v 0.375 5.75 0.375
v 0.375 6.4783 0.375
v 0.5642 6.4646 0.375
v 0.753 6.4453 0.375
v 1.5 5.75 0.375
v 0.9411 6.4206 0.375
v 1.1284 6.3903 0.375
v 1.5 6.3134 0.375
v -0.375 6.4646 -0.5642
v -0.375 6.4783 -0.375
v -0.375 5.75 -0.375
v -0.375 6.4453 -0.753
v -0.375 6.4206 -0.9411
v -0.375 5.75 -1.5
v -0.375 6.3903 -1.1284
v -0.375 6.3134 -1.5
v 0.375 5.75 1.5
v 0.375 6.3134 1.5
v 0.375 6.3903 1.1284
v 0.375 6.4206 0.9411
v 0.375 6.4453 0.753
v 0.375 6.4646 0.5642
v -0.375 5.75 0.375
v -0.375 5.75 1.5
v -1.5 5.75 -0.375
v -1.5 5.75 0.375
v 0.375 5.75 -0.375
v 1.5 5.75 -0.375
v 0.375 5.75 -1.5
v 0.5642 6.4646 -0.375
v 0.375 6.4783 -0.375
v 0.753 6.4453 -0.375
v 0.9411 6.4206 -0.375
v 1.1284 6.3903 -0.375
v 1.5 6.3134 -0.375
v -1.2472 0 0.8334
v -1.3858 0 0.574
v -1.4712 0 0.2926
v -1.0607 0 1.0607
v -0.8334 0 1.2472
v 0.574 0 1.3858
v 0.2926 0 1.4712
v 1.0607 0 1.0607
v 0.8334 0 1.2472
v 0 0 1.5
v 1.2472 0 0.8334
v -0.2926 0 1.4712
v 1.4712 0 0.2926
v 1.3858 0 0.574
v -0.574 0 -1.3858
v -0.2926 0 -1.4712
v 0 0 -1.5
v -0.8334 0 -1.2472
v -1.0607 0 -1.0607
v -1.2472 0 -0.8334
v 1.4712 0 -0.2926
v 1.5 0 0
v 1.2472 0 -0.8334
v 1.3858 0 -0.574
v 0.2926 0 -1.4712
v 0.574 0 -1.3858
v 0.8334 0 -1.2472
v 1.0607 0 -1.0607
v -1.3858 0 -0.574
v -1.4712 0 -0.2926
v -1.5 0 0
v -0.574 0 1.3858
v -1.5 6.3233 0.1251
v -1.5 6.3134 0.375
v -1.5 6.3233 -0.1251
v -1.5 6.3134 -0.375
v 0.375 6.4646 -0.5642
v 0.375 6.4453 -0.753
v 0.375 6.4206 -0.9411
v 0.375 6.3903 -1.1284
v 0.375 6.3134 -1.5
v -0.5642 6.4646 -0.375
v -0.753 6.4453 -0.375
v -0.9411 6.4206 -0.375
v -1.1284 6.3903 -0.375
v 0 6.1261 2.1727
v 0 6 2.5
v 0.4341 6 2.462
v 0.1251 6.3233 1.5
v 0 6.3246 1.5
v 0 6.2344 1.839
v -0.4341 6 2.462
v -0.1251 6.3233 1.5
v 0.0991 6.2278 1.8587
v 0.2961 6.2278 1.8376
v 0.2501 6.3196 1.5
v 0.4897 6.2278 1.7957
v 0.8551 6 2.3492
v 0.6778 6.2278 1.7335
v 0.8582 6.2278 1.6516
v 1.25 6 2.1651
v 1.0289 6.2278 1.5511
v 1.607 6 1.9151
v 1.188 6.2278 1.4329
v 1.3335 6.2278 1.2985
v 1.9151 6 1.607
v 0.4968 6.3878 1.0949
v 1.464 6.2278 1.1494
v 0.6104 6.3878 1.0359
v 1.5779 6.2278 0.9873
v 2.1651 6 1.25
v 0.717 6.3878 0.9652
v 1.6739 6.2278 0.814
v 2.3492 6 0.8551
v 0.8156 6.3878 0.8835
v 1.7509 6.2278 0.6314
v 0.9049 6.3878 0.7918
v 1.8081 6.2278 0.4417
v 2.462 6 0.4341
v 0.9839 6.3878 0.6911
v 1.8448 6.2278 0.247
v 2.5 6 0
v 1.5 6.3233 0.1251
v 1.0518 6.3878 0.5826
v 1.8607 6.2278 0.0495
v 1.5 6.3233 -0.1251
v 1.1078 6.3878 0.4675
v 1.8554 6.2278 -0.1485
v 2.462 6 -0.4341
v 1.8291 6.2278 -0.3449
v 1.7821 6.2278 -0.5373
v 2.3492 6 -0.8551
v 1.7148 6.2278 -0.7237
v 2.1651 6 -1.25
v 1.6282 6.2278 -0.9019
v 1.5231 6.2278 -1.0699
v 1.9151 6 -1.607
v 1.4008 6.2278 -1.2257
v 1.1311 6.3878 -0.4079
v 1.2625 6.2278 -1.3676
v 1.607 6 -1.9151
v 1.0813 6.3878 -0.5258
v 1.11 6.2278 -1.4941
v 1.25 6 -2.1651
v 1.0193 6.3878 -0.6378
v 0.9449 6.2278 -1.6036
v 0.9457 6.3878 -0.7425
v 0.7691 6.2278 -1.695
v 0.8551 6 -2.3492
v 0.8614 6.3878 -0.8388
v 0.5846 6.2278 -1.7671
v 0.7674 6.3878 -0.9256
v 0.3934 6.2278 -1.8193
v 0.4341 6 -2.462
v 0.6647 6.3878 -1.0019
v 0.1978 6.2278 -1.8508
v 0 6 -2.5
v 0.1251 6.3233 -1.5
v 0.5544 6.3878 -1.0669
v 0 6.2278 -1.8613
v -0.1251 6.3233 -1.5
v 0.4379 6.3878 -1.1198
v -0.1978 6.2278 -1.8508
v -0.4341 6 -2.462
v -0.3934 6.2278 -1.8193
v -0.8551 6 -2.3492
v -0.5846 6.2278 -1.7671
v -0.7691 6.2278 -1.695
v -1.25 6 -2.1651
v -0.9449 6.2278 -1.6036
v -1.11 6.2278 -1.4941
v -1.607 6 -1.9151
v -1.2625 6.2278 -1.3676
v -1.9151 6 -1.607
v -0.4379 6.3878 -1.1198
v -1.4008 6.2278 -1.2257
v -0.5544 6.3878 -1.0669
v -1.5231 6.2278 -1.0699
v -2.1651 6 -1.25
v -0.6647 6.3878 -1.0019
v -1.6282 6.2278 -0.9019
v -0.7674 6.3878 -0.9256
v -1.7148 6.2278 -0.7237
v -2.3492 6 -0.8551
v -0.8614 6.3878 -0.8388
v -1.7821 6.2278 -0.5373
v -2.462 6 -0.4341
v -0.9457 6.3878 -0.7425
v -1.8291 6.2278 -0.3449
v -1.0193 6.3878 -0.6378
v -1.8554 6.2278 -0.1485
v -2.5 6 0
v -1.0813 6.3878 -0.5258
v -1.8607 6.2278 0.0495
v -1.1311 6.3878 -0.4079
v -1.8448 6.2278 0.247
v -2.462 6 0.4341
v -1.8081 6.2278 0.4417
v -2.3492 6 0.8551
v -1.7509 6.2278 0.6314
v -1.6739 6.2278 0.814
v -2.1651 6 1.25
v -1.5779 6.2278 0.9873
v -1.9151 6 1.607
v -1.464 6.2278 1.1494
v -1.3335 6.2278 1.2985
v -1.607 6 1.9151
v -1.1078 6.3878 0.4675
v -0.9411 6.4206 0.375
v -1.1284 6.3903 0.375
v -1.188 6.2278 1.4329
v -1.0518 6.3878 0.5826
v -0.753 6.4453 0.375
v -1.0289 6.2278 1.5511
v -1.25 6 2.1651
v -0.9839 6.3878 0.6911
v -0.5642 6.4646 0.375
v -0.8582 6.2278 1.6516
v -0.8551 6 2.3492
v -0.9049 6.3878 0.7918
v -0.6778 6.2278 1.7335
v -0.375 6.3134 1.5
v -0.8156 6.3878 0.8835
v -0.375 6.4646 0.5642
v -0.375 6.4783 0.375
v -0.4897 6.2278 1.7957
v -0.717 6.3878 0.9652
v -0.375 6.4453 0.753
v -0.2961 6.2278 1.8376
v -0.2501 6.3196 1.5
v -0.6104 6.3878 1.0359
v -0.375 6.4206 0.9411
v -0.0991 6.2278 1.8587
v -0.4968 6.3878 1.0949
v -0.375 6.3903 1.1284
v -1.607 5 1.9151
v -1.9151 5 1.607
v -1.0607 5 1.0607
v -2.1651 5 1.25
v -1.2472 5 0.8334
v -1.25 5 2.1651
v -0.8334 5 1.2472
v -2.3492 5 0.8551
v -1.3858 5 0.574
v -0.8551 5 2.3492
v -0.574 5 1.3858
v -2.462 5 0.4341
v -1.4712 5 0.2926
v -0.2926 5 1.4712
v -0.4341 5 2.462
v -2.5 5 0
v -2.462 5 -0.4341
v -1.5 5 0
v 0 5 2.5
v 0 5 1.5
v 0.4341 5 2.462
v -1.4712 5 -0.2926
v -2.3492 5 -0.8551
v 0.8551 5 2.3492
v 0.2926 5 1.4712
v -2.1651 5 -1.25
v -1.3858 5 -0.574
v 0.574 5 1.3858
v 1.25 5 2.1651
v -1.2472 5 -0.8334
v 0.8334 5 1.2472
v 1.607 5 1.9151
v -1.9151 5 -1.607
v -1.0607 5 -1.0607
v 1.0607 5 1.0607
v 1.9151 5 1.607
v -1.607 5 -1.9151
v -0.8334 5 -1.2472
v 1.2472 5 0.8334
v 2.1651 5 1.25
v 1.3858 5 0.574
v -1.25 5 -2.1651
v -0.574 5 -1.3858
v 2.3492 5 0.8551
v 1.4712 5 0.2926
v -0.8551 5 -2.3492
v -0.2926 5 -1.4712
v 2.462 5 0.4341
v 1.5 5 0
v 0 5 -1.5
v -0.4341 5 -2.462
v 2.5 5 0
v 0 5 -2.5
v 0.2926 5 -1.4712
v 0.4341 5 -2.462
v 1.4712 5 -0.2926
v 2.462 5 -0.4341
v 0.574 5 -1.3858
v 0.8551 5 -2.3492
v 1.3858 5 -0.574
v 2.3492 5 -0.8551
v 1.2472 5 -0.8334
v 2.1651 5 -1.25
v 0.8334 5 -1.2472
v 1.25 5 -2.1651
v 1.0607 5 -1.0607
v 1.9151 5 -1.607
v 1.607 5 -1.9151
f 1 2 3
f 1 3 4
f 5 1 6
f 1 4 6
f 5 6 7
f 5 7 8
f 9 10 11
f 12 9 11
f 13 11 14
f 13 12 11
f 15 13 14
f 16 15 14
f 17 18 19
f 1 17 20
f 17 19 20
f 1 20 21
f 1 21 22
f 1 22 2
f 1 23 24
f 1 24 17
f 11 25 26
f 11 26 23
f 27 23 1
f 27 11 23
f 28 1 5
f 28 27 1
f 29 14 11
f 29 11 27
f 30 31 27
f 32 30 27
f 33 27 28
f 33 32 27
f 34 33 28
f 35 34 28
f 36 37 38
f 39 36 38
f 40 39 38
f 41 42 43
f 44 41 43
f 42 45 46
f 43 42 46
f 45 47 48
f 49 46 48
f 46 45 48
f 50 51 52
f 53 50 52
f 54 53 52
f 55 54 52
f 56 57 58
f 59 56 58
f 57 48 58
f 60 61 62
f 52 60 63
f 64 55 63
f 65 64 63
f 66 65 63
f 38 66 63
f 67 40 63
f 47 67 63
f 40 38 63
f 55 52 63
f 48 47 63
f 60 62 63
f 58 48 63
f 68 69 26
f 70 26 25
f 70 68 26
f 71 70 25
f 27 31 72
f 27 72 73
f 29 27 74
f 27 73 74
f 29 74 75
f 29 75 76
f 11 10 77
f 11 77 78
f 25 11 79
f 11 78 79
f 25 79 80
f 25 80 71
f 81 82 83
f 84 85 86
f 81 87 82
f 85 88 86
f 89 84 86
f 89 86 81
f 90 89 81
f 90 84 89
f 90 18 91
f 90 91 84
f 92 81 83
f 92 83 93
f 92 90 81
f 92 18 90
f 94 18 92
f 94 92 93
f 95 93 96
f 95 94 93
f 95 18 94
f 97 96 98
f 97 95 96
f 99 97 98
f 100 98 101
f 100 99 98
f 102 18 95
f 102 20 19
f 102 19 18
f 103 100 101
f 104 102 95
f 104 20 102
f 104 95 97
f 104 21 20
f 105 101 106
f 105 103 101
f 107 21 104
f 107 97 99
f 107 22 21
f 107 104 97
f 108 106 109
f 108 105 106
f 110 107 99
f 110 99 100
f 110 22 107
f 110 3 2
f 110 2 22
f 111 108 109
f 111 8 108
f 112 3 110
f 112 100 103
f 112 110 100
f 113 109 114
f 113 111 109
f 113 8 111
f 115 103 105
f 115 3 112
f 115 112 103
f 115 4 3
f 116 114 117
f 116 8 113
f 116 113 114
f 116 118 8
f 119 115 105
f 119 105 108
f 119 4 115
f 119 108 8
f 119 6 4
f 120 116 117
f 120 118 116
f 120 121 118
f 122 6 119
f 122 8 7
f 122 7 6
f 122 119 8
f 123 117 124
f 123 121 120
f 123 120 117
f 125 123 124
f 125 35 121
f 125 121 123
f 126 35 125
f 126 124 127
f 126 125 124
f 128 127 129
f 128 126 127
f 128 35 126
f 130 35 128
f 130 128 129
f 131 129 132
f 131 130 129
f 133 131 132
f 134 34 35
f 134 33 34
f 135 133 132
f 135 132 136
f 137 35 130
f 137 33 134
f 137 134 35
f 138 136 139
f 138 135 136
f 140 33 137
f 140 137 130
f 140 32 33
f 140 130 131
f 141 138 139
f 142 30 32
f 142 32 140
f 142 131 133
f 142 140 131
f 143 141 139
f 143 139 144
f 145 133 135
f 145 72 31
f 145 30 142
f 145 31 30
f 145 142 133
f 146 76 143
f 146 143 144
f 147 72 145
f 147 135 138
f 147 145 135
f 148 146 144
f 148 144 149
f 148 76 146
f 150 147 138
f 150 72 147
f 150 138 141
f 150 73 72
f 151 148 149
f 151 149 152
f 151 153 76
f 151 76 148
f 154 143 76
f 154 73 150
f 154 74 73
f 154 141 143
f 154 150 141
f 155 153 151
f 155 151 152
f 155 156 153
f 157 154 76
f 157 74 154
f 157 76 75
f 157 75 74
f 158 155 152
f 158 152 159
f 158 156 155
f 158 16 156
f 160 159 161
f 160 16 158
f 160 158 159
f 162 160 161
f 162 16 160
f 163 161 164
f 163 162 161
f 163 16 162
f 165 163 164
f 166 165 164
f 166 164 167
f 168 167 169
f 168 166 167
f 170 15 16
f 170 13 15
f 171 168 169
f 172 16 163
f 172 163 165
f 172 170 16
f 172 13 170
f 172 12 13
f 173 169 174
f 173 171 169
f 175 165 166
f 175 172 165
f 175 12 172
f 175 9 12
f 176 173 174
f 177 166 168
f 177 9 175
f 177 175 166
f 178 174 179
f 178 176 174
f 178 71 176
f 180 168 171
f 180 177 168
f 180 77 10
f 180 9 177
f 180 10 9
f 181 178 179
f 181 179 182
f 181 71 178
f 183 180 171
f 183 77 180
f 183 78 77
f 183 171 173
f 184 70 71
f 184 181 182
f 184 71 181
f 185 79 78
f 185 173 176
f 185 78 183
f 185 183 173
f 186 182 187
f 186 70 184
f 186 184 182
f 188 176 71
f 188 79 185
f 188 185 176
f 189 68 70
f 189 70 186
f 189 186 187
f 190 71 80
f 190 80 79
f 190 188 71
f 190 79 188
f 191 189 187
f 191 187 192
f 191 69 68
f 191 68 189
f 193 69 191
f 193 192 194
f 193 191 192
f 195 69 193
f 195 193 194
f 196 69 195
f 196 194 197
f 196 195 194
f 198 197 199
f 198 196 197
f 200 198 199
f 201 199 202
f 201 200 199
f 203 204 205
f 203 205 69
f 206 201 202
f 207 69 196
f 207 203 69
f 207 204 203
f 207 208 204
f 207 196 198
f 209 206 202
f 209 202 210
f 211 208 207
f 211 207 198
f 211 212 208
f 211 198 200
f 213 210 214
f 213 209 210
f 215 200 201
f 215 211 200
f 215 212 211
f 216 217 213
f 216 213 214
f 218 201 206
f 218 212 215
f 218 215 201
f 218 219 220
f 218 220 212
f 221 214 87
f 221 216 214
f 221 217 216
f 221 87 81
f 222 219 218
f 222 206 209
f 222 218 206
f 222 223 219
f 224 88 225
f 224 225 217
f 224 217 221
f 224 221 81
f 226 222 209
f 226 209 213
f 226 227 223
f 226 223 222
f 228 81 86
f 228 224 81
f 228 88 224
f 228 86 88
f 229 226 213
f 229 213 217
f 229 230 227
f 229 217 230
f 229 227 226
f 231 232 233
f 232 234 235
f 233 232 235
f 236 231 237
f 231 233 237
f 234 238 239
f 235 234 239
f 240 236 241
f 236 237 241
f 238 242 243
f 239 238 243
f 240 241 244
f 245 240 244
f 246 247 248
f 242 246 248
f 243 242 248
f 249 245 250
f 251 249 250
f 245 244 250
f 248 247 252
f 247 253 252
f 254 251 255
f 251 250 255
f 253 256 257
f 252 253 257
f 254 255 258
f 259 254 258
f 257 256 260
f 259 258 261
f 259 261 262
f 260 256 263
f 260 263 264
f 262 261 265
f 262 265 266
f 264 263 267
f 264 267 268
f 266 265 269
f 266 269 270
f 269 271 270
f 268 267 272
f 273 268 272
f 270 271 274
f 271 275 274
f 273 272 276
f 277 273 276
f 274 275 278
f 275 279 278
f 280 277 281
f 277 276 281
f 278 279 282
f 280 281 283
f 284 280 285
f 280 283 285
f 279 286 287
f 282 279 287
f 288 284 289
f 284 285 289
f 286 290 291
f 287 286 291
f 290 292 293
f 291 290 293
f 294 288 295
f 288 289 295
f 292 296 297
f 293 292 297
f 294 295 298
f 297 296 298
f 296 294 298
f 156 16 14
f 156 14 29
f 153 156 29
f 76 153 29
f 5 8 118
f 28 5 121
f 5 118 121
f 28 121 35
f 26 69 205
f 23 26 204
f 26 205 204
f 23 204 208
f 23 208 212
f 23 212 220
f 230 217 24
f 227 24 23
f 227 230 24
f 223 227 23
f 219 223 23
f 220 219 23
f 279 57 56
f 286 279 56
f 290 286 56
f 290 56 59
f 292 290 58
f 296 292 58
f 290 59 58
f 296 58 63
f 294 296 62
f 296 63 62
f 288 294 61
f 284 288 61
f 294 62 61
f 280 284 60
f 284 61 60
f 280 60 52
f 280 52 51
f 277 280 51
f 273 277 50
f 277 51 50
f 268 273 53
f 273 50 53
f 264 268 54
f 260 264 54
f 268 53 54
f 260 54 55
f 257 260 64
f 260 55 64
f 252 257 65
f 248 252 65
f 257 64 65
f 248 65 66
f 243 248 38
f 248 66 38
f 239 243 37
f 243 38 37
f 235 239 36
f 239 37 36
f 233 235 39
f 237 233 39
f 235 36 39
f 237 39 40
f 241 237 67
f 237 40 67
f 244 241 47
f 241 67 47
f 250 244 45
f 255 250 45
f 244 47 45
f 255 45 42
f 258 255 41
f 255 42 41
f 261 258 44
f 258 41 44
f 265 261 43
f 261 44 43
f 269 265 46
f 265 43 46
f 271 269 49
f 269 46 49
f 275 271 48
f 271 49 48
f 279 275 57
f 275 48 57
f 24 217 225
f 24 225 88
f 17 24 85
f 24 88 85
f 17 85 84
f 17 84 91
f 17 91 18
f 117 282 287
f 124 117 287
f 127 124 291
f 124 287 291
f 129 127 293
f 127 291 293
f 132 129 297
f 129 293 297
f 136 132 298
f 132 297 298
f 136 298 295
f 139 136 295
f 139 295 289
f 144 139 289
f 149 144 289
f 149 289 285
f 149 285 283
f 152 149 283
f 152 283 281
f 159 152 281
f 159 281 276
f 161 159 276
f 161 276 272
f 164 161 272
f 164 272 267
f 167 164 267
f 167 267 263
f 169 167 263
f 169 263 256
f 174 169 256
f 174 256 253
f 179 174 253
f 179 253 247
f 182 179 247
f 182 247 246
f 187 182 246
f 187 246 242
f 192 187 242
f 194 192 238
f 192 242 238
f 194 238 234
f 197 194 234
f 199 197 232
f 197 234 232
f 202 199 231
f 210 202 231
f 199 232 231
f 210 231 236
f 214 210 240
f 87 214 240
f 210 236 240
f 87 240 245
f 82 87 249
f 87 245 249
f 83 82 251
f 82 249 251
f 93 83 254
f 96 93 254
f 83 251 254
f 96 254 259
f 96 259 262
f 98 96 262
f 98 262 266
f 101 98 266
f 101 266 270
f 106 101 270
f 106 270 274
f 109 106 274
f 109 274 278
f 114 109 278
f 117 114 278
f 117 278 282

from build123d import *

# Parameters (mm, degrees)
SKETCH1_R           = 1.5
BOSS_EXTRUDE1_DEPTH = 5
SKETCH2_R           = 2.5
BOSS_EXTRUDE2_DEPTH = 1
DOME1_FACE_RADIUS   = 2.5
DOME1_HEIGHT        = 0.5
SKETCH3_W           = 1.125
SKETCH3_H           = 0.75
SKETCH3_W_2         = 0.75
SKETCH3_H_2         = 1.125
CUT_EXTRUDE1_DEPTH  = 0.75


with BuildPart() as part:
    # Sketch1 → Boss-Extrude1 (new body)
    with BuildSketch(Plane(origin=(0, 0, 0), x_dir=(1, 0, 0), z_dir=(0, 1, 0))):
        Circle(SKETCH1_R)
    extrude(amount=BOSS_EXTRUDE1_DEPTH)

    # Sketch2 → Boss-Extrude2 (add)
    with BuildSketch(Plane(origin=(0, 5, 0), x_dir=(1, 0, 0), z_dir=(0, 1, 0))):
        Circle(SKETCH2_R)
    extrude(amount=BOSS_EXTRUDE2_DEPTH)

    # Dome1: a dome of height H over a round flat face of radius A is a cap of a sphere of radius (A * A + H * H) / (2 * H)
    dome1_r = (DOME1_FACE_RADIUS * DOME1_FACE_RADIUS + DOME1_HEIGHT * DOME1_HEIGHT) / (2 * DOME1_HEIGHT)
    dome1_base = Plane((0, 6, 0), z_dir=(0, 1, 0))
    with Locations(dome1_base.offset(DOME1_HEIGHT - dome1_r)):
        dome1_ball = Sphere(dome1_r, mode=Mode.PRIVATE)
    add(split(dome1_ball, bisect_by=dome1_base, keep=Keep.TOP, mode=Mode.PRIVATE))

    # Sketch3 → Cut-Extrude1 (cut)
    with BuildSketch(Plane(origin=(0, 6.5, 0), x_dir=(1, 0, 0), z_dir=(0, 1, 0))):
        with Locations((-0.9375, 0)):
            Rectangle(SKETCH3_W, SKETCH3_H)
        Rectangle(SKETCH3_W_2, SKETCH3_H)
        with Locations((0, 0.9375)):
            Rectangle(SKETCH3_W_2, SKETCH3_H_2)
        with Locations((0.9375, 0)):
            Rectangle(SKETCH3_W, SKETCH3_H)
        with Locations((0, -0.9375)):
            Rectangle(SKETCH3_W_2, SKETCH3_H_2)
    extrude(amount=-CUT_EXTRUDE1_DEPTH, mode=Mode.SUBTRACT)


solid = part.part
